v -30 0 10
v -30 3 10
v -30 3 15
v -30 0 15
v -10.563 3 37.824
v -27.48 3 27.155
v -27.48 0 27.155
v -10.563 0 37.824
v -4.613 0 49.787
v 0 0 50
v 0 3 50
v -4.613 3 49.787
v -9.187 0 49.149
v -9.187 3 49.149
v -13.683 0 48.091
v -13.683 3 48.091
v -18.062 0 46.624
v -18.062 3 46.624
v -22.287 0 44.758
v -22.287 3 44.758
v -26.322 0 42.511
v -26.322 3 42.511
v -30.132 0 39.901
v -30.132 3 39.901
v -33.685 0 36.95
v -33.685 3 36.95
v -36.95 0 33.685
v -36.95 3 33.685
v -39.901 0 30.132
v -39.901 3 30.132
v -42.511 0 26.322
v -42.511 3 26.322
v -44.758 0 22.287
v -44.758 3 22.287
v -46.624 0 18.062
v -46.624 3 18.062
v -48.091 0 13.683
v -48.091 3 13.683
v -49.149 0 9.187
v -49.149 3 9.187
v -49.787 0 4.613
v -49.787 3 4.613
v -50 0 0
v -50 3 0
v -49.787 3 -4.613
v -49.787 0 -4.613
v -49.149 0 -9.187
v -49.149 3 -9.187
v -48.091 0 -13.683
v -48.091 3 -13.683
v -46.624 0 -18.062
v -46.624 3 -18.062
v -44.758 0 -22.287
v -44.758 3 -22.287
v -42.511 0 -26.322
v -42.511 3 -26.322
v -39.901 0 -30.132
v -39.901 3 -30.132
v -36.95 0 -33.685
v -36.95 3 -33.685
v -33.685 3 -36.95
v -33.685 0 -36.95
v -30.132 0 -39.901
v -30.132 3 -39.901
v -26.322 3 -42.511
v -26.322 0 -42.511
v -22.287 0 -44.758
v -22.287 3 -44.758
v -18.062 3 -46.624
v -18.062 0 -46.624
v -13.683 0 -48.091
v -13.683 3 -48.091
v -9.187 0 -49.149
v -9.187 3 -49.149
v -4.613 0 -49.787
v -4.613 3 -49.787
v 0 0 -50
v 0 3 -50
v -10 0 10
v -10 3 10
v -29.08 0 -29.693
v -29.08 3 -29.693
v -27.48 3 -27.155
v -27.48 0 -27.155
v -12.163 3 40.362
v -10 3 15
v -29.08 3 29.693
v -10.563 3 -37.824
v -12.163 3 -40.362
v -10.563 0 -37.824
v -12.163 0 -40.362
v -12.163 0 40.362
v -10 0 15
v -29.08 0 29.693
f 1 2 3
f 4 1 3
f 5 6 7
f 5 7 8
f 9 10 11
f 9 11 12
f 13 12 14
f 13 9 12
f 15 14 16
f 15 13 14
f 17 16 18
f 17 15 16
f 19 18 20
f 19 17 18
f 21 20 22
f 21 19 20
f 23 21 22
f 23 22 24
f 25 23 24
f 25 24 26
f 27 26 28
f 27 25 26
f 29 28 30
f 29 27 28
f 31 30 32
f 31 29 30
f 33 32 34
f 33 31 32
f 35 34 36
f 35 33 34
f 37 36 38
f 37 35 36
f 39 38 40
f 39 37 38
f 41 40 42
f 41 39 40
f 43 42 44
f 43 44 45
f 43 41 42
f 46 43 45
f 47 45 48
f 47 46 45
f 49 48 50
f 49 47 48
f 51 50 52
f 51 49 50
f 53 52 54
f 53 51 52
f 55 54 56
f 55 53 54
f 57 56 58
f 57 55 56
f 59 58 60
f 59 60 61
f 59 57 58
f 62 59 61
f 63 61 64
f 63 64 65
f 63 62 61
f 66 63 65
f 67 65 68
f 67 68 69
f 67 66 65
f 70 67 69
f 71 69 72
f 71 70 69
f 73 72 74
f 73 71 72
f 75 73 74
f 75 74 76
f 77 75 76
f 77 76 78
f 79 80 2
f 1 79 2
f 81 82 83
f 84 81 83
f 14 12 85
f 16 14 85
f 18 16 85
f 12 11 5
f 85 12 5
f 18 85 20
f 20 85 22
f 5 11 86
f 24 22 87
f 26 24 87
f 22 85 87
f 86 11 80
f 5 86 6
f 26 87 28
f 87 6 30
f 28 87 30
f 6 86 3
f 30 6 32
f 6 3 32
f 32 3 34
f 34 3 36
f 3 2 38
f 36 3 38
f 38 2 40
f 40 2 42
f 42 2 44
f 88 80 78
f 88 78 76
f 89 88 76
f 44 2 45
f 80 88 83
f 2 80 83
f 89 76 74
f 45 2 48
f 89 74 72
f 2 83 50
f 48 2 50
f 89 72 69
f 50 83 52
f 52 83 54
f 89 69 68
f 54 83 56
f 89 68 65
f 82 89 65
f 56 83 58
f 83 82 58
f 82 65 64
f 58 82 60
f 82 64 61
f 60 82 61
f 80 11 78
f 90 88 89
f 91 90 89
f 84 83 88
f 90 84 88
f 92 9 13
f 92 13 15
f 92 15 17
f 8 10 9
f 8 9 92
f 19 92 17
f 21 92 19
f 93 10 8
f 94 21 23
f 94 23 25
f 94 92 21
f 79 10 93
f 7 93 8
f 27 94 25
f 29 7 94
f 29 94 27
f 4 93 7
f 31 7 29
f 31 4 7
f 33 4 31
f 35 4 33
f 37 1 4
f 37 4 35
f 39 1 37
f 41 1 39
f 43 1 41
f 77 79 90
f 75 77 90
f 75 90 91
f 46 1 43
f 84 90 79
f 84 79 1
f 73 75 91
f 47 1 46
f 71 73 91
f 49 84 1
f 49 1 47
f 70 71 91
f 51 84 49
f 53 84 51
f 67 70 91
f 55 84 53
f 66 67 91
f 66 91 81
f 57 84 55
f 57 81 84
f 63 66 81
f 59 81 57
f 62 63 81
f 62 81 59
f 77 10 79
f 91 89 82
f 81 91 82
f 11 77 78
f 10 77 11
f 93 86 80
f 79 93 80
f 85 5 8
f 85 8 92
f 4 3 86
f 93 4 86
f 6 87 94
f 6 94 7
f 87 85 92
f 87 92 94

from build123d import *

# Parameters (mm, degrees)
EXTRUDE_1_DEPTH     = 3
CUT_EXTRUDE_1_DEPTH = 5
CUT_EXTRUDE_2_DEPTH = 5


with BuildPart() as part:
    # 草图1 → 凸台-拉伸1 (new body)
    with BuildSketch(Plane(origin=(0, 0, 0), x_dir=(1, 0, 0), z_dir=(0, 1, 0))):
        with BuildLine():
            Line((0, 50), (0, -50))
            ThreePointArc((0, -50), (-50, 0), (0, 50))
        make_face()
    extrude(amount=EXTRUDE_1_DEPTH)

    # 草图3 → 切除-拉伸1 (cut)
    with BuildSketch(Plane(origin=(0, 3, 0), x_dir=(1, 0, 0), z_dir=(0, 1, 0))):
        Polygon((-27.479570649, 27.155271417), (-10.562944149, 37.824280175), (-12.163295463, 40.36177415), (-29.079921962, 29.692765392), align=None)
        Polygon((-29.079921962, -29.692765392), (-27.479570649, -27.155271417), (-10.562944149, -37.824280175), (-12.163295463, -40.36177415), align=None)
    extrude(amount=-CUT_EXTRUDE_1_DEPTH, mode=Mode.SUBTRACT)

    # 草图4 → 切除-拉伸2 (cut)
    with BuildSketch(Plane(origin=(0, 3, 0), x_dir=(1, 0, 0), z_dir=(0, 1, 0))):
        Polygon((-29.442581692, -10), (-30, -10), (-30, -15), (-10, -15), (-10, -10), align=None)
    extrude(amount=-CUT_EXTRUDE_2_DEPTH, mode=Mode.SUBTRACT)


solid = part.part
